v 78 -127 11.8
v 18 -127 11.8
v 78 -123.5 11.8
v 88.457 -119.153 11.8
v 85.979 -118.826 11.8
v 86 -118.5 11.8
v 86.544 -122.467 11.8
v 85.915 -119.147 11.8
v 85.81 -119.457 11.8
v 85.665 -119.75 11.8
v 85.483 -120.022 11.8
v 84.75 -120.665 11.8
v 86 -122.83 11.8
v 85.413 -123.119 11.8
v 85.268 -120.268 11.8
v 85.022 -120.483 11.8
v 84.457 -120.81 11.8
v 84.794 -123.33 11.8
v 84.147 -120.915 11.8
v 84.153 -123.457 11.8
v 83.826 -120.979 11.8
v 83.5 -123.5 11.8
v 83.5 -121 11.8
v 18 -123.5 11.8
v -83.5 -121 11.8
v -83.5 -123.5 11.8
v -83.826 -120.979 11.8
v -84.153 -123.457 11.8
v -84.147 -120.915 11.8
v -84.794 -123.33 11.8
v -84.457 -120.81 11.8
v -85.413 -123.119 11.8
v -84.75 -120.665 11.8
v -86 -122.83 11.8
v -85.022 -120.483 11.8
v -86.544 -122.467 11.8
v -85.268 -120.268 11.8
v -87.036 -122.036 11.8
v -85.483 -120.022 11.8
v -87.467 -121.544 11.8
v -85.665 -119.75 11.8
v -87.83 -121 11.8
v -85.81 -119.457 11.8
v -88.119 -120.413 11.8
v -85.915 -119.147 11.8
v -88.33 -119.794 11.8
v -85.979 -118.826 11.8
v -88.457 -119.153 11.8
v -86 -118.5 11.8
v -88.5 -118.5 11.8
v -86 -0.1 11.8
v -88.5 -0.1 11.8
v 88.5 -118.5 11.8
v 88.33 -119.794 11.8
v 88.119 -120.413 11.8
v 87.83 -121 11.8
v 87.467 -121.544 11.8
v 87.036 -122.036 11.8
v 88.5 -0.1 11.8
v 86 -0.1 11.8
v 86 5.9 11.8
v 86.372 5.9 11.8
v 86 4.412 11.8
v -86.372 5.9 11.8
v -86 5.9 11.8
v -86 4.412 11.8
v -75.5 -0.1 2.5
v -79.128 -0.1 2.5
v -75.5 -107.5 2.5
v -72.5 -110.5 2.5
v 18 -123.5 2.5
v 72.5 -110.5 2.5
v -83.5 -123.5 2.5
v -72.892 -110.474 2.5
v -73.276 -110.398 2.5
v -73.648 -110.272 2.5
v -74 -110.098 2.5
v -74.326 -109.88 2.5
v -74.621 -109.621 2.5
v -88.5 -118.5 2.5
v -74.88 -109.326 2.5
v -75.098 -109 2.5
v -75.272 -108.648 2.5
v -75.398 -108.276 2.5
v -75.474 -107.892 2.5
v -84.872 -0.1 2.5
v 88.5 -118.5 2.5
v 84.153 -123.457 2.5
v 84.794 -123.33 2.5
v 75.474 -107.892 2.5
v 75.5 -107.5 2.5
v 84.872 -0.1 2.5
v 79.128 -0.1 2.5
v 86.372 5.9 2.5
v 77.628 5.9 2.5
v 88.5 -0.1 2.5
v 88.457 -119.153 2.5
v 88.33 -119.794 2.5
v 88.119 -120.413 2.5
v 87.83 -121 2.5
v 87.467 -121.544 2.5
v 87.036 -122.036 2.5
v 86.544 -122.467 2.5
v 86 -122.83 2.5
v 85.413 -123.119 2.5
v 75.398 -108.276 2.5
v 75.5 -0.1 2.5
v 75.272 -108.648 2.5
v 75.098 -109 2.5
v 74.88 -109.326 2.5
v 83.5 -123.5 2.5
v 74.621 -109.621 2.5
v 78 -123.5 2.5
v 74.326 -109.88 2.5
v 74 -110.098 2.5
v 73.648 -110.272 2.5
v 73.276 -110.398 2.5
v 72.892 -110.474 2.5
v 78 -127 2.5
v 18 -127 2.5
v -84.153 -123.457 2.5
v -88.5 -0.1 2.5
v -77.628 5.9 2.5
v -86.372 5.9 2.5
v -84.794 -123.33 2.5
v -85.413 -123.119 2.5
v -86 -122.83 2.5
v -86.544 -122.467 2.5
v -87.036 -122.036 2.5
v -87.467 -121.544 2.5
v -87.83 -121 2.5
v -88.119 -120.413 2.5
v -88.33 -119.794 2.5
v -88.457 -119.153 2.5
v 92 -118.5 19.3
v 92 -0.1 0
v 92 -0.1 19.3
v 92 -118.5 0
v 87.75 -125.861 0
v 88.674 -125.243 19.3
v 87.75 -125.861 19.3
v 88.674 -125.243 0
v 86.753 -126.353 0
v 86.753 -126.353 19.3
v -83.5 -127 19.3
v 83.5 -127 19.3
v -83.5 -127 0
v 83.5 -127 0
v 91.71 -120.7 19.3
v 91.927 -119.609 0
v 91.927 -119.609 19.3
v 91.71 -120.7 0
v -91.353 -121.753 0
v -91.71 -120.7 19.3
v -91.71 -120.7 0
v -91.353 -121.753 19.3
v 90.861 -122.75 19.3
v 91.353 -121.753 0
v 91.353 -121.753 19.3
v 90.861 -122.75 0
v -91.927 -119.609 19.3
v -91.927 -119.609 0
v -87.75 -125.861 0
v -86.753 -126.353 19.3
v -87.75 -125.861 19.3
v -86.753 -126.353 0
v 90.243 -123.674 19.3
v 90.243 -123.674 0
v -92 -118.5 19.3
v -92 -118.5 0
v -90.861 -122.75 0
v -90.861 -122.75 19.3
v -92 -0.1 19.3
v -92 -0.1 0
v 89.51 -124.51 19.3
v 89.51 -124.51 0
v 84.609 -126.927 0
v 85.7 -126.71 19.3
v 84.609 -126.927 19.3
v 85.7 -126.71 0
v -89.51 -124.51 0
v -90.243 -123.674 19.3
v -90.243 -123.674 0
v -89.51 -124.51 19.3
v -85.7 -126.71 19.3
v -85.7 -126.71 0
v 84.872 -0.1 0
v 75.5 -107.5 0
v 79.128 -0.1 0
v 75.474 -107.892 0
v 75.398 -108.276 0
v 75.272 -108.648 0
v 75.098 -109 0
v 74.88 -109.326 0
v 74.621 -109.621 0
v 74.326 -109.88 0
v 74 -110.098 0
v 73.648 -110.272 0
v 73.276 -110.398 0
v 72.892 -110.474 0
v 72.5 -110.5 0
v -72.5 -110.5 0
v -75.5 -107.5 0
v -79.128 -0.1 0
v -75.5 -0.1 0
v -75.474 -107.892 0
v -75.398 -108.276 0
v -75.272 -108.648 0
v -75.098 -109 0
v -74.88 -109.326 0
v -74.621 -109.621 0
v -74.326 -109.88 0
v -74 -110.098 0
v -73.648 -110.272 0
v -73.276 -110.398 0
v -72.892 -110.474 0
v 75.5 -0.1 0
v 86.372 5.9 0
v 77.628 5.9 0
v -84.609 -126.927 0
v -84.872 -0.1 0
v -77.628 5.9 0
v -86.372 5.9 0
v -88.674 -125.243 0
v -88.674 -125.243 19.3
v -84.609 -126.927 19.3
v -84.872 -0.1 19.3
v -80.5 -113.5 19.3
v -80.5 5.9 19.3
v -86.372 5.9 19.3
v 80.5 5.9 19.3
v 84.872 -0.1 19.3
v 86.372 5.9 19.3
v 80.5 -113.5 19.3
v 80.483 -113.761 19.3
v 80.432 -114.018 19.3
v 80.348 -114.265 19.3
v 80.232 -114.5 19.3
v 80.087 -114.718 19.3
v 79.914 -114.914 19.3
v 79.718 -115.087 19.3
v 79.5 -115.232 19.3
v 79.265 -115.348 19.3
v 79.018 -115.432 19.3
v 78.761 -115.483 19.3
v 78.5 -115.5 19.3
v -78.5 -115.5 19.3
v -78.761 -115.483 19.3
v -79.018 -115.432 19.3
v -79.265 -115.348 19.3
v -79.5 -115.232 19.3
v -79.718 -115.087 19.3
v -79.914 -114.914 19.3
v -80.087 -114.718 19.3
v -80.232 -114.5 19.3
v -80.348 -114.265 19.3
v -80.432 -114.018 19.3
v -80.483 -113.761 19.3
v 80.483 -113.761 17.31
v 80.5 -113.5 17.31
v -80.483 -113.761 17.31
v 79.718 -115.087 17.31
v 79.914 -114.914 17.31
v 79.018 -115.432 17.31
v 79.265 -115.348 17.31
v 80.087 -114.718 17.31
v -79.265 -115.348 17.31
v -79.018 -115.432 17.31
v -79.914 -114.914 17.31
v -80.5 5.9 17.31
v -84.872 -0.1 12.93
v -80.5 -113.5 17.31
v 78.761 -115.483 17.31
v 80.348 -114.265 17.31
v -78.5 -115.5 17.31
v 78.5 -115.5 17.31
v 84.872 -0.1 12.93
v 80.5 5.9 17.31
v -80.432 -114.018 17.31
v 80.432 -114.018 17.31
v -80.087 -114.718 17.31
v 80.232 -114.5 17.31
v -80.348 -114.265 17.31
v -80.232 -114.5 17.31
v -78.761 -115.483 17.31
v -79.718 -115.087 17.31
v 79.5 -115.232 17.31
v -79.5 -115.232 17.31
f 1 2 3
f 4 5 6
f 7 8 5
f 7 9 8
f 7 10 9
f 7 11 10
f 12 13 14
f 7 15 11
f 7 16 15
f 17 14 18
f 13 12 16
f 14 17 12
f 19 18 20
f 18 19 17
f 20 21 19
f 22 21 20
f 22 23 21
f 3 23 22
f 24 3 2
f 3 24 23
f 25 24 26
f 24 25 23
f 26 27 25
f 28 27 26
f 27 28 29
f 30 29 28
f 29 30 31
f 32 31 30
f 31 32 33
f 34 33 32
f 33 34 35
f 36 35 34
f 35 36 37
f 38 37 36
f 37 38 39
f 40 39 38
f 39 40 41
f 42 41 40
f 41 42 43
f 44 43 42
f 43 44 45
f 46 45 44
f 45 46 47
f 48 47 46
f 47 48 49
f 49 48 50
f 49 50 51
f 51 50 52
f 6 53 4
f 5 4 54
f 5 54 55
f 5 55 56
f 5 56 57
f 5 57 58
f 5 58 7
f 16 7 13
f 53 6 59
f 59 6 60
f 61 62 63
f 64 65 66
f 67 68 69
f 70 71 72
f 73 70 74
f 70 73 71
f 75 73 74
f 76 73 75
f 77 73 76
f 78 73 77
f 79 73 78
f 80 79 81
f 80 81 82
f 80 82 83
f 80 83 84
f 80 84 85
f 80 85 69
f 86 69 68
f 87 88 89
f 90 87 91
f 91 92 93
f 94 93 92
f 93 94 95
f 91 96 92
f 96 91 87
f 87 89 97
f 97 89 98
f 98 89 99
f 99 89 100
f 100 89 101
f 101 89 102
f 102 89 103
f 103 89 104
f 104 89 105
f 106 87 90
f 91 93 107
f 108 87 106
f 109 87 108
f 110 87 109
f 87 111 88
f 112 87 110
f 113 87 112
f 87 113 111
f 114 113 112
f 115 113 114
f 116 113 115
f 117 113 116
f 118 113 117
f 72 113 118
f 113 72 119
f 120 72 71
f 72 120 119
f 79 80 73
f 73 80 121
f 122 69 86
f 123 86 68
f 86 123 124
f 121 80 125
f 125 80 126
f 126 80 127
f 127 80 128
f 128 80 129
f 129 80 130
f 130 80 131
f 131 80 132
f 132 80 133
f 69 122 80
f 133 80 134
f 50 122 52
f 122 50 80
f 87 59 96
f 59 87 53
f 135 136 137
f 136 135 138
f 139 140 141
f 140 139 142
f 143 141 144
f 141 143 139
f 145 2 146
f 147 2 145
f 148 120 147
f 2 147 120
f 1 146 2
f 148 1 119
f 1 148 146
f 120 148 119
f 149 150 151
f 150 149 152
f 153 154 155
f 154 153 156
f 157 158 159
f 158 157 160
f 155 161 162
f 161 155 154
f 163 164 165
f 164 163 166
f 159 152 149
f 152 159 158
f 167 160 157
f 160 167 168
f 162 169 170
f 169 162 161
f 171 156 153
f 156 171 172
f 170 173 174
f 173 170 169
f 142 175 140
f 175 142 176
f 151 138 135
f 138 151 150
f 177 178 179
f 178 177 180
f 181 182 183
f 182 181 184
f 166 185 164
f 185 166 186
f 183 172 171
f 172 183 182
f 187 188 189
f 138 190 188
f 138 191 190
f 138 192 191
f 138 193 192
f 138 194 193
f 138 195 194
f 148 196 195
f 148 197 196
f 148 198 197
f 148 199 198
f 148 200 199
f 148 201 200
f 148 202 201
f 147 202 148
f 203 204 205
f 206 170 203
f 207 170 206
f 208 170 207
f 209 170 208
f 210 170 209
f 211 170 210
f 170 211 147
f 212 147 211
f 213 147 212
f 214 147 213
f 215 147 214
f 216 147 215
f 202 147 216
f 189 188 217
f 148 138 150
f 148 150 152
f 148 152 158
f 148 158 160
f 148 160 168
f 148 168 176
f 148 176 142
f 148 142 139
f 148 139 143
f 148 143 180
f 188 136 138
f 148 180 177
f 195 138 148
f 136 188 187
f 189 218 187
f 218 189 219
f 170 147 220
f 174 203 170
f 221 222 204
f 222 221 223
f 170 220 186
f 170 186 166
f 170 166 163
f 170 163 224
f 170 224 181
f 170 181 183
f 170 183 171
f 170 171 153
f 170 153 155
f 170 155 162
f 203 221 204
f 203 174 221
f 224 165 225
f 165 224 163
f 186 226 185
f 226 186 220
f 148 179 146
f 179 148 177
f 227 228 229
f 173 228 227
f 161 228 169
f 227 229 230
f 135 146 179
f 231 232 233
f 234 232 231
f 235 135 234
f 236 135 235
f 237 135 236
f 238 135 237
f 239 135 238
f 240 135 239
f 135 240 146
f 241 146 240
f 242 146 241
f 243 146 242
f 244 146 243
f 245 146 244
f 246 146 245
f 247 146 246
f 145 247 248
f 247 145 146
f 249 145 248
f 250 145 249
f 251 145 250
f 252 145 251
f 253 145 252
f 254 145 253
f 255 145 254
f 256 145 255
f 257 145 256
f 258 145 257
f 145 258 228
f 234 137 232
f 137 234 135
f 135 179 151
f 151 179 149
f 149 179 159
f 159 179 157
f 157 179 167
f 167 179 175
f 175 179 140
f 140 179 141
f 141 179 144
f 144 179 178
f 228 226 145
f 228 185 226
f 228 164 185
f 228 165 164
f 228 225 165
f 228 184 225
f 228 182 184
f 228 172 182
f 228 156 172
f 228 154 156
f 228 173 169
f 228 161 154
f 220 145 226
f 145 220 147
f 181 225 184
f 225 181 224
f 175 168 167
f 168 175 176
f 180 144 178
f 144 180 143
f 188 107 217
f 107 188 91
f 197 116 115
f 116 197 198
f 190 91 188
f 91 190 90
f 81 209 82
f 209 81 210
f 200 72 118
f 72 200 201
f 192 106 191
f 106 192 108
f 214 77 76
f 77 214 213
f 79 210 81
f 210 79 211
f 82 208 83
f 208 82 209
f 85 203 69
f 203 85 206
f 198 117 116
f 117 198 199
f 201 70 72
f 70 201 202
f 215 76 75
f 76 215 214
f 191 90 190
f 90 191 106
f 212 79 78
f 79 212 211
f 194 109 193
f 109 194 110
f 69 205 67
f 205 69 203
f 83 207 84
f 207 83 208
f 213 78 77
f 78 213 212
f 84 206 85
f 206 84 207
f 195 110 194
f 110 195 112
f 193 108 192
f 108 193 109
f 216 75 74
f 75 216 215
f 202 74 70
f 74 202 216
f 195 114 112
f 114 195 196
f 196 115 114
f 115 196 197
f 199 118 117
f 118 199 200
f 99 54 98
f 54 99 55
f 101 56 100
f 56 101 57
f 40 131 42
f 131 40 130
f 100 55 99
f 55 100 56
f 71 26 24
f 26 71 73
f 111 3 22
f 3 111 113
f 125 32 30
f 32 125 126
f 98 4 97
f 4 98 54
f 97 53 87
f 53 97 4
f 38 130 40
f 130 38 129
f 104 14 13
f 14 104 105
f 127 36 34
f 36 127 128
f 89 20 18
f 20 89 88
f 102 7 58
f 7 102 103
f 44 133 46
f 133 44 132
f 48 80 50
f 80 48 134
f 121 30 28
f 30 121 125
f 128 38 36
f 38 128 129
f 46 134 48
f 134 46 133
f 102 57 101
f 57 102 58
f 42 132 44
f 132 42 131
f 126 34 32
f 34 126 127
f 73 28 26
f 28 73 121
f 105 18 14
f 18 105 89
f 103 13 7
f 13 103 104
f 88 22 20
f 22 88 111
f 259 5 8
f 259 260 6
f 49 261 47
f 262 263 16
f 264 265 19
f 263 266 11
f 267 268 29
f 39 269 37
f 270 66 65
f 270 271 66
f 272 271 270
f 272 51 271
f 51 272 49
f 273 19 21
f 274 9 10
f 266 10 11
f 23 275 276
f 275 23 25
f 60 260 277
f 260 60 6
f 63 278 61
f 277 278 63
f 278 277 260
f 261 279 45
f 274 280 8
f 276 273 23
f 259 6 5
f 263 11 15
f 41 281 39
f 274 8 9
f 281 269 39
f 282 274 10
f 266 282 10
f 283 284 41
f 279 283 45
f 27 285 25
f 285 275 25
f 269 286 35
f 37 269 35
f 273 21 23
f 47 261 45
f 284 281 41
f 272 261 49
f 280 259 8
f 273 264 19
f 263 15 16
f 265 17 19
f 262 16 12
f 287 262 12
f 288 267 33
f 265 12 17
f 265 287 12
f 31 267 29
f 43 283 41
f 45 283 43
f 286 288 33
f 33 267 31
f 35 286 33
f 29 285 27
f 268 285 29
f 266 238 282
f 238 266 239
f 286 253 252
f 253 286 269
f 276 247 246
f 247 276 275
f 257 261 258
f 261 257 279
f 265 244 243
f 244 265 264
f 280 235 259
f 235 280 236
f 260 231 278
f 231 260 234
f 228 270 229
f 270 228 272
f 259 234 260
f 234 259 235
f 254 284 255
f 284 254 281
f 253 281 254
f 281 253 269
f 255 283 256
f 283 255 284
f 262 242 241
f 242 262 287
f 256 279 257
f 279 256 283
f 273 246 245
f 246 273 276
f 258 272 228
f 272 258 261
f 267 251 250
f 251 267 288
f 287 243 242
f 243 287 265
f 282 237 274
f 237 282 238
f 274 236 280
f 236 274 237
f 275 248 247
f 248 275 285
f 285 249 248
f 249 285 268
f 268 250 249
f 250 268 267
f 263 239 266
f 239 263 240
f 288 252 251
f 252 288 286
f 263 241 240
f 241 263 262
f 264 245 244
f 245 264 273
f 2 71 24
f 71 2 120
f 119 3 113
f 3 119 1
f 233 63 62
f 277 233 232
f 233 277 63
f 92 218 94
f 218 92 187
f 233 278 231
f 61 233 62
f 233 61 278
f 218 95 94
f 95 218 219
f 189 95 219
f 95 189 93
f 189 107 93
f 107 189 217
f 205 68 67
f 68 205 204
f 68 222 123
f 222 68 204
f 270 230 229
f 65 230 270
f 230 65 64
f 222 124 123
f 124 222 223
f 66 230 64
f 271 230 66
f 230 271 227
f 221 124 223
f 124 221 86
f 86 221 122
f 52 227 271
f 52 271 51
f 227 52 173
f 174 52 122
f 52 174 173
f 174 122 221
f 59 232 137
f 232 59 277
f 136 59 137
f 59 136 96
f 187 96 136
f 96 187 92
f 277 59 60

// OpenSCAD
// file: surface-go-window-frame.scad
// Slide-in window frame for the Surface Go (1st gen) shop screen.
//
// The flat front face goes against the inside of the window glass, taped all
// the way round (12 mm VHB, e.g. 3M 5952). The tablet slides in from the open
// top edge, between the front lip and the back lip, and rests on the bottom wall.
// The Surface Connect slot is on the tablet's right edge as seen from outside
// (looking at the screen), near the bottom. Seen from the room that is the left wall.
//
// This file renders the landscape frame (open on a long edge).
// surface-go-window-frame-portrait.scad renders the portrait one (open on a
// short edge, charger at the bottom). It reuses the modules here, so change
// dimensions in this file only. The -left/-right and -portrait-top/-bottom
// files render the two halves of each frame for a 256 mm bed.
//
// Anti-rattle: the pocket has 1 mm of front-back play. Stick a strip of 1 mm
// self-adhesive felt along the back of the tablet's two side edges and bottom
// edge (within 6 mm of the edge, where the back rim overlaps it).
//
// Print front face down on the bed (clean, flat face for the tape). No supports:
// the back rim overhangs 2.5 mm flat, then slopes at 45 degrees, and there is
// no rim over the opening. Only the charger slot is bridged (60 mm).
// Strength: 4 walls (perimeters), 30% gyroid infill.
// Units mm. Coordinates as seen from the ROOM (the tablet's back) in landscape: x right,
// y up, z from the glass (0) towards the room.
//
// Licence: CC BY-NC 4.0

/* [Tablet - Surface Go 1 is 245 x 175 x 8.3] */
tab_w = 245.0;
tab_h = 175.0;
tab_t = 8.3;
clear = 1.0;           // per side around the tablet edge
play_t = 1.0;          // front-back play; a 1 mm felt strip takes it up
tab_r = 5.0;           // pocket corner radius (keep <= tablet's corner radius)

/* [Frame] */
wall = 3.5;            // side wall thickness (3.5 keeps the frame inside a 256 mm bed)
lip = 2.5;             // front lip thickness (glass side)
lip_over = 13.0;       // front lip covers the bezel this far (screen starts ~17 in)
back_flat = 2.5;       // back rim: flat overhang (prints without support)
back_over = 8.0;       // back rim: total reach over the tablet's back
back_skin = 2.0;       // back rim thickness above the 45 degree slope

/* [Cutouts - tablet edges as in landscape] */
// (room view: the charger edge is the LEFT wall, the buttons are top RIGHT)
cable_y = [-78, -18];  // Surface Connect slot in the left wall (room view), y range
btn_x = [68, 112];     // power + volume on the top edge (room view), x range

/* [Split for printing - two halves, dovetails + glue] */
dt_neck = 6.0;         // dovetail width at the seam
dt_head = 9.0;         // dovetail width at its tip
dt_len = 6.0;          // how far the dovetail reaches into the other half
dt_fit = 0.2;          // total gap between the halves (all round the dovetail)

$fn = 48;

// --- derived ---------------------------------------------------------------
pw = tab_w + 2 * clear;          // pocket 247 x 177
ph = tab_h + 2 * clear;
ow = pw + 2 * wall;              // outer 254 x 184
oh = ph + 2 * wall;
o_r = tab_r + wall;

z_pocket0 = lip;
z_back = lip + tab_t + play_t;   // tablet back / start of back lip
z_slope = z_back + (back_over - back_flat);
z_top = z_slope + back_skin;

win_w = pw - 2 * lip_over;       // 221 x 151 window (screen ~211 x 141)
win_h = ph - 2 * lip_over;

echo(str("outer ", ow, " x ", oh, " x ", z_top, "  window ", win_w, " x ", win_h,
         "  tape strip ", wall + lip_over));

assert(ow <= 255 && oh <= 255, "frame no longer fits a 256 mm bed");

// --- helpers ---------------------------------------------------------------
module rrect(w, h, r) {
    offset(r = r) square([w - 2 * r, h - 2 * r], center = true);
}

module box(x0, x1, y0, y1, z0, z1) {
    translate([x0, y0, z0]) cube([x1 - x0, y1 - y0, z1 - z0]);
}

module slab(inset, z) {
    translate([0, 0, z]) linear_extrude(0.01)
        rrect(pw - 2 * inset, ph - 2 * inset, max(tab_r - inset, 2));
}

// --- frame -----------------------------------------------------------------
// open = "top"  : landscape, tablet slides down onto its long bottom edge
// open = "right": portrait, opening on the edge opposite the charger (room
//                 view right wall); hung so the charger edge is at the bottom
module frame(open = "top") frame_body(open);

module frame_body(open) {
    big = 50;
    difference() {
        linear_extrude(z_top) rrect(ow, oh, o_r);

        // screen window, all the way through
        translate([0, 0, -1]) linear_extrude(z_top + 2) rrect(win_w, win_h, 3);
        // tablet pocket
        translate([0, 0, z_pocket0]) linear_extrude(z_back - z_pocket0) rrect(pw, ph, tab_r);
        // back opening: flat overhang, then 45 degree slope, then straight up
        hull() {
            slab(back_flat, z_back - 0.01);
            slab(back_over, z_slope);
        }
        translate([0, 0, z_slope - 0.01])
            linear_extrude(z_top) rrect(pw - 2 * back_over, ph - 2 * back_over, 2);

        // the opening: wall removed between the lips, and no back rim on that
        // edge (it would be a full-width bridge; the side rims hold the tablet)
        if (open == "top") {
            box(-pw / 2, pw / 2, 0, big + ph / 2, z_pocket0, z_back);
            box(-pw / 2, pw / 2, ph / 2 - back_over - 1, big + ph / 2, z_back - 0.01, z_top + 1);
        } else {
            box(0, big + pw / 2, -ph / 2, ph / 2, z_pocket0, z_back);
            box(pw / 2 - back_over - 1, big + pw / 2, -ph / 2, ph / 2, z_back - 0.01, z_top + 1);
        }

        // Surface Connect slot (left wall seen from the room = right edge seen from outside)
        box(-ow / 2 - 1, -pw / 2 + 1, cable_y[0], cable_y[1], z_pocket0, z_back);
        // power / volume access (top edge) when the top is closed
        if (open != "top")
            box(btn_x[0], btn_x[1], ph / 2 - 1, oh / 2 + 1, z_pocket0, z_back);
    }
}

// --- split into two halves (seam at x = 0, frame coordinates) --------------
// A 256 mm bed can't really take the 254 mm frame, so each frame also comes as
// two halves. A dovetail on the -x half sits in the middle of the front lip band
// above and below the screen window and locks into the +x half. The lip is the
// face on the bed, so the dovetails print flat; the VHB tape also spans the seam.
dt_y = (win_h / 2 + ph / 2) / 2;   // centre of the lip band
assert(dt_y + dt_head / 2 <= ph / 2 - 1.5, "dovetail too close to the pocket edge");
assert(dt_y - dt_head / 2 >= win_h / 2 + 1.5, "dovetail too close to the screen window");

module minus_x_region() {
    translate([-ow, -oh]) square([ow, 2 * oh]);
    for (s = [1, -1])
        polygon([[-1, s * dt_y - dt_neck / 2], [0, s * dt_y - dt_neck / 2],
                 [dt_len, s * dt_y - dt_head / 2], [dt_len, s * dt_y + dt_head / 2],
                 [0, s * dt_y + dt_neck / 2], [-1, s * dt_y + dt_neck / 2]]);
}

// half = -1 (the -x half, with the dovetails) or 1 (the +x half, with the sockets)
module frame_half(open, half) {
    if (half < 0)
        intersection() {
            frame(open);
            translate([0, 0, -1]) linear_extrude(z_top + 2) offset(delta = -dt_fit / 2) minus_x_region();
        }
    else
        difference() {
            frame(open);
            translate([0, 0, -1]) linear_extrude(z_top + 2) offset(delta = dt_fit / 2) minus_x_region();
        }
}

// Shown as it hangs: portrait is turned so the opening is at the top.
module frame_landscape() frame("top");
module frame_portrait() rotate([0, 0, 90]) frame("right");
module frame_landscape_left()   frame_half("top", -1);
module frame_landscape_right()  frame_half("top", 1);
module frame_portrait_bottom()  rotate([0, 0, 90]) frame_half("right", -1);
module frame_portrait_top()     rotate([0, 0, 90]) frame_half("right", 1);

frame_landscape();
// main file
// Bottom half of the portrait Surface Go window frame, for a 256 mm bed (Bambu A1/P1/X1).
// Print front face down, no supports. Glue to the other half at the dovetails.
// Dimensions come from surface-go-window-frame.scad.
use <surface-go-window-frame.scad>

frame_portrait_bottom();
